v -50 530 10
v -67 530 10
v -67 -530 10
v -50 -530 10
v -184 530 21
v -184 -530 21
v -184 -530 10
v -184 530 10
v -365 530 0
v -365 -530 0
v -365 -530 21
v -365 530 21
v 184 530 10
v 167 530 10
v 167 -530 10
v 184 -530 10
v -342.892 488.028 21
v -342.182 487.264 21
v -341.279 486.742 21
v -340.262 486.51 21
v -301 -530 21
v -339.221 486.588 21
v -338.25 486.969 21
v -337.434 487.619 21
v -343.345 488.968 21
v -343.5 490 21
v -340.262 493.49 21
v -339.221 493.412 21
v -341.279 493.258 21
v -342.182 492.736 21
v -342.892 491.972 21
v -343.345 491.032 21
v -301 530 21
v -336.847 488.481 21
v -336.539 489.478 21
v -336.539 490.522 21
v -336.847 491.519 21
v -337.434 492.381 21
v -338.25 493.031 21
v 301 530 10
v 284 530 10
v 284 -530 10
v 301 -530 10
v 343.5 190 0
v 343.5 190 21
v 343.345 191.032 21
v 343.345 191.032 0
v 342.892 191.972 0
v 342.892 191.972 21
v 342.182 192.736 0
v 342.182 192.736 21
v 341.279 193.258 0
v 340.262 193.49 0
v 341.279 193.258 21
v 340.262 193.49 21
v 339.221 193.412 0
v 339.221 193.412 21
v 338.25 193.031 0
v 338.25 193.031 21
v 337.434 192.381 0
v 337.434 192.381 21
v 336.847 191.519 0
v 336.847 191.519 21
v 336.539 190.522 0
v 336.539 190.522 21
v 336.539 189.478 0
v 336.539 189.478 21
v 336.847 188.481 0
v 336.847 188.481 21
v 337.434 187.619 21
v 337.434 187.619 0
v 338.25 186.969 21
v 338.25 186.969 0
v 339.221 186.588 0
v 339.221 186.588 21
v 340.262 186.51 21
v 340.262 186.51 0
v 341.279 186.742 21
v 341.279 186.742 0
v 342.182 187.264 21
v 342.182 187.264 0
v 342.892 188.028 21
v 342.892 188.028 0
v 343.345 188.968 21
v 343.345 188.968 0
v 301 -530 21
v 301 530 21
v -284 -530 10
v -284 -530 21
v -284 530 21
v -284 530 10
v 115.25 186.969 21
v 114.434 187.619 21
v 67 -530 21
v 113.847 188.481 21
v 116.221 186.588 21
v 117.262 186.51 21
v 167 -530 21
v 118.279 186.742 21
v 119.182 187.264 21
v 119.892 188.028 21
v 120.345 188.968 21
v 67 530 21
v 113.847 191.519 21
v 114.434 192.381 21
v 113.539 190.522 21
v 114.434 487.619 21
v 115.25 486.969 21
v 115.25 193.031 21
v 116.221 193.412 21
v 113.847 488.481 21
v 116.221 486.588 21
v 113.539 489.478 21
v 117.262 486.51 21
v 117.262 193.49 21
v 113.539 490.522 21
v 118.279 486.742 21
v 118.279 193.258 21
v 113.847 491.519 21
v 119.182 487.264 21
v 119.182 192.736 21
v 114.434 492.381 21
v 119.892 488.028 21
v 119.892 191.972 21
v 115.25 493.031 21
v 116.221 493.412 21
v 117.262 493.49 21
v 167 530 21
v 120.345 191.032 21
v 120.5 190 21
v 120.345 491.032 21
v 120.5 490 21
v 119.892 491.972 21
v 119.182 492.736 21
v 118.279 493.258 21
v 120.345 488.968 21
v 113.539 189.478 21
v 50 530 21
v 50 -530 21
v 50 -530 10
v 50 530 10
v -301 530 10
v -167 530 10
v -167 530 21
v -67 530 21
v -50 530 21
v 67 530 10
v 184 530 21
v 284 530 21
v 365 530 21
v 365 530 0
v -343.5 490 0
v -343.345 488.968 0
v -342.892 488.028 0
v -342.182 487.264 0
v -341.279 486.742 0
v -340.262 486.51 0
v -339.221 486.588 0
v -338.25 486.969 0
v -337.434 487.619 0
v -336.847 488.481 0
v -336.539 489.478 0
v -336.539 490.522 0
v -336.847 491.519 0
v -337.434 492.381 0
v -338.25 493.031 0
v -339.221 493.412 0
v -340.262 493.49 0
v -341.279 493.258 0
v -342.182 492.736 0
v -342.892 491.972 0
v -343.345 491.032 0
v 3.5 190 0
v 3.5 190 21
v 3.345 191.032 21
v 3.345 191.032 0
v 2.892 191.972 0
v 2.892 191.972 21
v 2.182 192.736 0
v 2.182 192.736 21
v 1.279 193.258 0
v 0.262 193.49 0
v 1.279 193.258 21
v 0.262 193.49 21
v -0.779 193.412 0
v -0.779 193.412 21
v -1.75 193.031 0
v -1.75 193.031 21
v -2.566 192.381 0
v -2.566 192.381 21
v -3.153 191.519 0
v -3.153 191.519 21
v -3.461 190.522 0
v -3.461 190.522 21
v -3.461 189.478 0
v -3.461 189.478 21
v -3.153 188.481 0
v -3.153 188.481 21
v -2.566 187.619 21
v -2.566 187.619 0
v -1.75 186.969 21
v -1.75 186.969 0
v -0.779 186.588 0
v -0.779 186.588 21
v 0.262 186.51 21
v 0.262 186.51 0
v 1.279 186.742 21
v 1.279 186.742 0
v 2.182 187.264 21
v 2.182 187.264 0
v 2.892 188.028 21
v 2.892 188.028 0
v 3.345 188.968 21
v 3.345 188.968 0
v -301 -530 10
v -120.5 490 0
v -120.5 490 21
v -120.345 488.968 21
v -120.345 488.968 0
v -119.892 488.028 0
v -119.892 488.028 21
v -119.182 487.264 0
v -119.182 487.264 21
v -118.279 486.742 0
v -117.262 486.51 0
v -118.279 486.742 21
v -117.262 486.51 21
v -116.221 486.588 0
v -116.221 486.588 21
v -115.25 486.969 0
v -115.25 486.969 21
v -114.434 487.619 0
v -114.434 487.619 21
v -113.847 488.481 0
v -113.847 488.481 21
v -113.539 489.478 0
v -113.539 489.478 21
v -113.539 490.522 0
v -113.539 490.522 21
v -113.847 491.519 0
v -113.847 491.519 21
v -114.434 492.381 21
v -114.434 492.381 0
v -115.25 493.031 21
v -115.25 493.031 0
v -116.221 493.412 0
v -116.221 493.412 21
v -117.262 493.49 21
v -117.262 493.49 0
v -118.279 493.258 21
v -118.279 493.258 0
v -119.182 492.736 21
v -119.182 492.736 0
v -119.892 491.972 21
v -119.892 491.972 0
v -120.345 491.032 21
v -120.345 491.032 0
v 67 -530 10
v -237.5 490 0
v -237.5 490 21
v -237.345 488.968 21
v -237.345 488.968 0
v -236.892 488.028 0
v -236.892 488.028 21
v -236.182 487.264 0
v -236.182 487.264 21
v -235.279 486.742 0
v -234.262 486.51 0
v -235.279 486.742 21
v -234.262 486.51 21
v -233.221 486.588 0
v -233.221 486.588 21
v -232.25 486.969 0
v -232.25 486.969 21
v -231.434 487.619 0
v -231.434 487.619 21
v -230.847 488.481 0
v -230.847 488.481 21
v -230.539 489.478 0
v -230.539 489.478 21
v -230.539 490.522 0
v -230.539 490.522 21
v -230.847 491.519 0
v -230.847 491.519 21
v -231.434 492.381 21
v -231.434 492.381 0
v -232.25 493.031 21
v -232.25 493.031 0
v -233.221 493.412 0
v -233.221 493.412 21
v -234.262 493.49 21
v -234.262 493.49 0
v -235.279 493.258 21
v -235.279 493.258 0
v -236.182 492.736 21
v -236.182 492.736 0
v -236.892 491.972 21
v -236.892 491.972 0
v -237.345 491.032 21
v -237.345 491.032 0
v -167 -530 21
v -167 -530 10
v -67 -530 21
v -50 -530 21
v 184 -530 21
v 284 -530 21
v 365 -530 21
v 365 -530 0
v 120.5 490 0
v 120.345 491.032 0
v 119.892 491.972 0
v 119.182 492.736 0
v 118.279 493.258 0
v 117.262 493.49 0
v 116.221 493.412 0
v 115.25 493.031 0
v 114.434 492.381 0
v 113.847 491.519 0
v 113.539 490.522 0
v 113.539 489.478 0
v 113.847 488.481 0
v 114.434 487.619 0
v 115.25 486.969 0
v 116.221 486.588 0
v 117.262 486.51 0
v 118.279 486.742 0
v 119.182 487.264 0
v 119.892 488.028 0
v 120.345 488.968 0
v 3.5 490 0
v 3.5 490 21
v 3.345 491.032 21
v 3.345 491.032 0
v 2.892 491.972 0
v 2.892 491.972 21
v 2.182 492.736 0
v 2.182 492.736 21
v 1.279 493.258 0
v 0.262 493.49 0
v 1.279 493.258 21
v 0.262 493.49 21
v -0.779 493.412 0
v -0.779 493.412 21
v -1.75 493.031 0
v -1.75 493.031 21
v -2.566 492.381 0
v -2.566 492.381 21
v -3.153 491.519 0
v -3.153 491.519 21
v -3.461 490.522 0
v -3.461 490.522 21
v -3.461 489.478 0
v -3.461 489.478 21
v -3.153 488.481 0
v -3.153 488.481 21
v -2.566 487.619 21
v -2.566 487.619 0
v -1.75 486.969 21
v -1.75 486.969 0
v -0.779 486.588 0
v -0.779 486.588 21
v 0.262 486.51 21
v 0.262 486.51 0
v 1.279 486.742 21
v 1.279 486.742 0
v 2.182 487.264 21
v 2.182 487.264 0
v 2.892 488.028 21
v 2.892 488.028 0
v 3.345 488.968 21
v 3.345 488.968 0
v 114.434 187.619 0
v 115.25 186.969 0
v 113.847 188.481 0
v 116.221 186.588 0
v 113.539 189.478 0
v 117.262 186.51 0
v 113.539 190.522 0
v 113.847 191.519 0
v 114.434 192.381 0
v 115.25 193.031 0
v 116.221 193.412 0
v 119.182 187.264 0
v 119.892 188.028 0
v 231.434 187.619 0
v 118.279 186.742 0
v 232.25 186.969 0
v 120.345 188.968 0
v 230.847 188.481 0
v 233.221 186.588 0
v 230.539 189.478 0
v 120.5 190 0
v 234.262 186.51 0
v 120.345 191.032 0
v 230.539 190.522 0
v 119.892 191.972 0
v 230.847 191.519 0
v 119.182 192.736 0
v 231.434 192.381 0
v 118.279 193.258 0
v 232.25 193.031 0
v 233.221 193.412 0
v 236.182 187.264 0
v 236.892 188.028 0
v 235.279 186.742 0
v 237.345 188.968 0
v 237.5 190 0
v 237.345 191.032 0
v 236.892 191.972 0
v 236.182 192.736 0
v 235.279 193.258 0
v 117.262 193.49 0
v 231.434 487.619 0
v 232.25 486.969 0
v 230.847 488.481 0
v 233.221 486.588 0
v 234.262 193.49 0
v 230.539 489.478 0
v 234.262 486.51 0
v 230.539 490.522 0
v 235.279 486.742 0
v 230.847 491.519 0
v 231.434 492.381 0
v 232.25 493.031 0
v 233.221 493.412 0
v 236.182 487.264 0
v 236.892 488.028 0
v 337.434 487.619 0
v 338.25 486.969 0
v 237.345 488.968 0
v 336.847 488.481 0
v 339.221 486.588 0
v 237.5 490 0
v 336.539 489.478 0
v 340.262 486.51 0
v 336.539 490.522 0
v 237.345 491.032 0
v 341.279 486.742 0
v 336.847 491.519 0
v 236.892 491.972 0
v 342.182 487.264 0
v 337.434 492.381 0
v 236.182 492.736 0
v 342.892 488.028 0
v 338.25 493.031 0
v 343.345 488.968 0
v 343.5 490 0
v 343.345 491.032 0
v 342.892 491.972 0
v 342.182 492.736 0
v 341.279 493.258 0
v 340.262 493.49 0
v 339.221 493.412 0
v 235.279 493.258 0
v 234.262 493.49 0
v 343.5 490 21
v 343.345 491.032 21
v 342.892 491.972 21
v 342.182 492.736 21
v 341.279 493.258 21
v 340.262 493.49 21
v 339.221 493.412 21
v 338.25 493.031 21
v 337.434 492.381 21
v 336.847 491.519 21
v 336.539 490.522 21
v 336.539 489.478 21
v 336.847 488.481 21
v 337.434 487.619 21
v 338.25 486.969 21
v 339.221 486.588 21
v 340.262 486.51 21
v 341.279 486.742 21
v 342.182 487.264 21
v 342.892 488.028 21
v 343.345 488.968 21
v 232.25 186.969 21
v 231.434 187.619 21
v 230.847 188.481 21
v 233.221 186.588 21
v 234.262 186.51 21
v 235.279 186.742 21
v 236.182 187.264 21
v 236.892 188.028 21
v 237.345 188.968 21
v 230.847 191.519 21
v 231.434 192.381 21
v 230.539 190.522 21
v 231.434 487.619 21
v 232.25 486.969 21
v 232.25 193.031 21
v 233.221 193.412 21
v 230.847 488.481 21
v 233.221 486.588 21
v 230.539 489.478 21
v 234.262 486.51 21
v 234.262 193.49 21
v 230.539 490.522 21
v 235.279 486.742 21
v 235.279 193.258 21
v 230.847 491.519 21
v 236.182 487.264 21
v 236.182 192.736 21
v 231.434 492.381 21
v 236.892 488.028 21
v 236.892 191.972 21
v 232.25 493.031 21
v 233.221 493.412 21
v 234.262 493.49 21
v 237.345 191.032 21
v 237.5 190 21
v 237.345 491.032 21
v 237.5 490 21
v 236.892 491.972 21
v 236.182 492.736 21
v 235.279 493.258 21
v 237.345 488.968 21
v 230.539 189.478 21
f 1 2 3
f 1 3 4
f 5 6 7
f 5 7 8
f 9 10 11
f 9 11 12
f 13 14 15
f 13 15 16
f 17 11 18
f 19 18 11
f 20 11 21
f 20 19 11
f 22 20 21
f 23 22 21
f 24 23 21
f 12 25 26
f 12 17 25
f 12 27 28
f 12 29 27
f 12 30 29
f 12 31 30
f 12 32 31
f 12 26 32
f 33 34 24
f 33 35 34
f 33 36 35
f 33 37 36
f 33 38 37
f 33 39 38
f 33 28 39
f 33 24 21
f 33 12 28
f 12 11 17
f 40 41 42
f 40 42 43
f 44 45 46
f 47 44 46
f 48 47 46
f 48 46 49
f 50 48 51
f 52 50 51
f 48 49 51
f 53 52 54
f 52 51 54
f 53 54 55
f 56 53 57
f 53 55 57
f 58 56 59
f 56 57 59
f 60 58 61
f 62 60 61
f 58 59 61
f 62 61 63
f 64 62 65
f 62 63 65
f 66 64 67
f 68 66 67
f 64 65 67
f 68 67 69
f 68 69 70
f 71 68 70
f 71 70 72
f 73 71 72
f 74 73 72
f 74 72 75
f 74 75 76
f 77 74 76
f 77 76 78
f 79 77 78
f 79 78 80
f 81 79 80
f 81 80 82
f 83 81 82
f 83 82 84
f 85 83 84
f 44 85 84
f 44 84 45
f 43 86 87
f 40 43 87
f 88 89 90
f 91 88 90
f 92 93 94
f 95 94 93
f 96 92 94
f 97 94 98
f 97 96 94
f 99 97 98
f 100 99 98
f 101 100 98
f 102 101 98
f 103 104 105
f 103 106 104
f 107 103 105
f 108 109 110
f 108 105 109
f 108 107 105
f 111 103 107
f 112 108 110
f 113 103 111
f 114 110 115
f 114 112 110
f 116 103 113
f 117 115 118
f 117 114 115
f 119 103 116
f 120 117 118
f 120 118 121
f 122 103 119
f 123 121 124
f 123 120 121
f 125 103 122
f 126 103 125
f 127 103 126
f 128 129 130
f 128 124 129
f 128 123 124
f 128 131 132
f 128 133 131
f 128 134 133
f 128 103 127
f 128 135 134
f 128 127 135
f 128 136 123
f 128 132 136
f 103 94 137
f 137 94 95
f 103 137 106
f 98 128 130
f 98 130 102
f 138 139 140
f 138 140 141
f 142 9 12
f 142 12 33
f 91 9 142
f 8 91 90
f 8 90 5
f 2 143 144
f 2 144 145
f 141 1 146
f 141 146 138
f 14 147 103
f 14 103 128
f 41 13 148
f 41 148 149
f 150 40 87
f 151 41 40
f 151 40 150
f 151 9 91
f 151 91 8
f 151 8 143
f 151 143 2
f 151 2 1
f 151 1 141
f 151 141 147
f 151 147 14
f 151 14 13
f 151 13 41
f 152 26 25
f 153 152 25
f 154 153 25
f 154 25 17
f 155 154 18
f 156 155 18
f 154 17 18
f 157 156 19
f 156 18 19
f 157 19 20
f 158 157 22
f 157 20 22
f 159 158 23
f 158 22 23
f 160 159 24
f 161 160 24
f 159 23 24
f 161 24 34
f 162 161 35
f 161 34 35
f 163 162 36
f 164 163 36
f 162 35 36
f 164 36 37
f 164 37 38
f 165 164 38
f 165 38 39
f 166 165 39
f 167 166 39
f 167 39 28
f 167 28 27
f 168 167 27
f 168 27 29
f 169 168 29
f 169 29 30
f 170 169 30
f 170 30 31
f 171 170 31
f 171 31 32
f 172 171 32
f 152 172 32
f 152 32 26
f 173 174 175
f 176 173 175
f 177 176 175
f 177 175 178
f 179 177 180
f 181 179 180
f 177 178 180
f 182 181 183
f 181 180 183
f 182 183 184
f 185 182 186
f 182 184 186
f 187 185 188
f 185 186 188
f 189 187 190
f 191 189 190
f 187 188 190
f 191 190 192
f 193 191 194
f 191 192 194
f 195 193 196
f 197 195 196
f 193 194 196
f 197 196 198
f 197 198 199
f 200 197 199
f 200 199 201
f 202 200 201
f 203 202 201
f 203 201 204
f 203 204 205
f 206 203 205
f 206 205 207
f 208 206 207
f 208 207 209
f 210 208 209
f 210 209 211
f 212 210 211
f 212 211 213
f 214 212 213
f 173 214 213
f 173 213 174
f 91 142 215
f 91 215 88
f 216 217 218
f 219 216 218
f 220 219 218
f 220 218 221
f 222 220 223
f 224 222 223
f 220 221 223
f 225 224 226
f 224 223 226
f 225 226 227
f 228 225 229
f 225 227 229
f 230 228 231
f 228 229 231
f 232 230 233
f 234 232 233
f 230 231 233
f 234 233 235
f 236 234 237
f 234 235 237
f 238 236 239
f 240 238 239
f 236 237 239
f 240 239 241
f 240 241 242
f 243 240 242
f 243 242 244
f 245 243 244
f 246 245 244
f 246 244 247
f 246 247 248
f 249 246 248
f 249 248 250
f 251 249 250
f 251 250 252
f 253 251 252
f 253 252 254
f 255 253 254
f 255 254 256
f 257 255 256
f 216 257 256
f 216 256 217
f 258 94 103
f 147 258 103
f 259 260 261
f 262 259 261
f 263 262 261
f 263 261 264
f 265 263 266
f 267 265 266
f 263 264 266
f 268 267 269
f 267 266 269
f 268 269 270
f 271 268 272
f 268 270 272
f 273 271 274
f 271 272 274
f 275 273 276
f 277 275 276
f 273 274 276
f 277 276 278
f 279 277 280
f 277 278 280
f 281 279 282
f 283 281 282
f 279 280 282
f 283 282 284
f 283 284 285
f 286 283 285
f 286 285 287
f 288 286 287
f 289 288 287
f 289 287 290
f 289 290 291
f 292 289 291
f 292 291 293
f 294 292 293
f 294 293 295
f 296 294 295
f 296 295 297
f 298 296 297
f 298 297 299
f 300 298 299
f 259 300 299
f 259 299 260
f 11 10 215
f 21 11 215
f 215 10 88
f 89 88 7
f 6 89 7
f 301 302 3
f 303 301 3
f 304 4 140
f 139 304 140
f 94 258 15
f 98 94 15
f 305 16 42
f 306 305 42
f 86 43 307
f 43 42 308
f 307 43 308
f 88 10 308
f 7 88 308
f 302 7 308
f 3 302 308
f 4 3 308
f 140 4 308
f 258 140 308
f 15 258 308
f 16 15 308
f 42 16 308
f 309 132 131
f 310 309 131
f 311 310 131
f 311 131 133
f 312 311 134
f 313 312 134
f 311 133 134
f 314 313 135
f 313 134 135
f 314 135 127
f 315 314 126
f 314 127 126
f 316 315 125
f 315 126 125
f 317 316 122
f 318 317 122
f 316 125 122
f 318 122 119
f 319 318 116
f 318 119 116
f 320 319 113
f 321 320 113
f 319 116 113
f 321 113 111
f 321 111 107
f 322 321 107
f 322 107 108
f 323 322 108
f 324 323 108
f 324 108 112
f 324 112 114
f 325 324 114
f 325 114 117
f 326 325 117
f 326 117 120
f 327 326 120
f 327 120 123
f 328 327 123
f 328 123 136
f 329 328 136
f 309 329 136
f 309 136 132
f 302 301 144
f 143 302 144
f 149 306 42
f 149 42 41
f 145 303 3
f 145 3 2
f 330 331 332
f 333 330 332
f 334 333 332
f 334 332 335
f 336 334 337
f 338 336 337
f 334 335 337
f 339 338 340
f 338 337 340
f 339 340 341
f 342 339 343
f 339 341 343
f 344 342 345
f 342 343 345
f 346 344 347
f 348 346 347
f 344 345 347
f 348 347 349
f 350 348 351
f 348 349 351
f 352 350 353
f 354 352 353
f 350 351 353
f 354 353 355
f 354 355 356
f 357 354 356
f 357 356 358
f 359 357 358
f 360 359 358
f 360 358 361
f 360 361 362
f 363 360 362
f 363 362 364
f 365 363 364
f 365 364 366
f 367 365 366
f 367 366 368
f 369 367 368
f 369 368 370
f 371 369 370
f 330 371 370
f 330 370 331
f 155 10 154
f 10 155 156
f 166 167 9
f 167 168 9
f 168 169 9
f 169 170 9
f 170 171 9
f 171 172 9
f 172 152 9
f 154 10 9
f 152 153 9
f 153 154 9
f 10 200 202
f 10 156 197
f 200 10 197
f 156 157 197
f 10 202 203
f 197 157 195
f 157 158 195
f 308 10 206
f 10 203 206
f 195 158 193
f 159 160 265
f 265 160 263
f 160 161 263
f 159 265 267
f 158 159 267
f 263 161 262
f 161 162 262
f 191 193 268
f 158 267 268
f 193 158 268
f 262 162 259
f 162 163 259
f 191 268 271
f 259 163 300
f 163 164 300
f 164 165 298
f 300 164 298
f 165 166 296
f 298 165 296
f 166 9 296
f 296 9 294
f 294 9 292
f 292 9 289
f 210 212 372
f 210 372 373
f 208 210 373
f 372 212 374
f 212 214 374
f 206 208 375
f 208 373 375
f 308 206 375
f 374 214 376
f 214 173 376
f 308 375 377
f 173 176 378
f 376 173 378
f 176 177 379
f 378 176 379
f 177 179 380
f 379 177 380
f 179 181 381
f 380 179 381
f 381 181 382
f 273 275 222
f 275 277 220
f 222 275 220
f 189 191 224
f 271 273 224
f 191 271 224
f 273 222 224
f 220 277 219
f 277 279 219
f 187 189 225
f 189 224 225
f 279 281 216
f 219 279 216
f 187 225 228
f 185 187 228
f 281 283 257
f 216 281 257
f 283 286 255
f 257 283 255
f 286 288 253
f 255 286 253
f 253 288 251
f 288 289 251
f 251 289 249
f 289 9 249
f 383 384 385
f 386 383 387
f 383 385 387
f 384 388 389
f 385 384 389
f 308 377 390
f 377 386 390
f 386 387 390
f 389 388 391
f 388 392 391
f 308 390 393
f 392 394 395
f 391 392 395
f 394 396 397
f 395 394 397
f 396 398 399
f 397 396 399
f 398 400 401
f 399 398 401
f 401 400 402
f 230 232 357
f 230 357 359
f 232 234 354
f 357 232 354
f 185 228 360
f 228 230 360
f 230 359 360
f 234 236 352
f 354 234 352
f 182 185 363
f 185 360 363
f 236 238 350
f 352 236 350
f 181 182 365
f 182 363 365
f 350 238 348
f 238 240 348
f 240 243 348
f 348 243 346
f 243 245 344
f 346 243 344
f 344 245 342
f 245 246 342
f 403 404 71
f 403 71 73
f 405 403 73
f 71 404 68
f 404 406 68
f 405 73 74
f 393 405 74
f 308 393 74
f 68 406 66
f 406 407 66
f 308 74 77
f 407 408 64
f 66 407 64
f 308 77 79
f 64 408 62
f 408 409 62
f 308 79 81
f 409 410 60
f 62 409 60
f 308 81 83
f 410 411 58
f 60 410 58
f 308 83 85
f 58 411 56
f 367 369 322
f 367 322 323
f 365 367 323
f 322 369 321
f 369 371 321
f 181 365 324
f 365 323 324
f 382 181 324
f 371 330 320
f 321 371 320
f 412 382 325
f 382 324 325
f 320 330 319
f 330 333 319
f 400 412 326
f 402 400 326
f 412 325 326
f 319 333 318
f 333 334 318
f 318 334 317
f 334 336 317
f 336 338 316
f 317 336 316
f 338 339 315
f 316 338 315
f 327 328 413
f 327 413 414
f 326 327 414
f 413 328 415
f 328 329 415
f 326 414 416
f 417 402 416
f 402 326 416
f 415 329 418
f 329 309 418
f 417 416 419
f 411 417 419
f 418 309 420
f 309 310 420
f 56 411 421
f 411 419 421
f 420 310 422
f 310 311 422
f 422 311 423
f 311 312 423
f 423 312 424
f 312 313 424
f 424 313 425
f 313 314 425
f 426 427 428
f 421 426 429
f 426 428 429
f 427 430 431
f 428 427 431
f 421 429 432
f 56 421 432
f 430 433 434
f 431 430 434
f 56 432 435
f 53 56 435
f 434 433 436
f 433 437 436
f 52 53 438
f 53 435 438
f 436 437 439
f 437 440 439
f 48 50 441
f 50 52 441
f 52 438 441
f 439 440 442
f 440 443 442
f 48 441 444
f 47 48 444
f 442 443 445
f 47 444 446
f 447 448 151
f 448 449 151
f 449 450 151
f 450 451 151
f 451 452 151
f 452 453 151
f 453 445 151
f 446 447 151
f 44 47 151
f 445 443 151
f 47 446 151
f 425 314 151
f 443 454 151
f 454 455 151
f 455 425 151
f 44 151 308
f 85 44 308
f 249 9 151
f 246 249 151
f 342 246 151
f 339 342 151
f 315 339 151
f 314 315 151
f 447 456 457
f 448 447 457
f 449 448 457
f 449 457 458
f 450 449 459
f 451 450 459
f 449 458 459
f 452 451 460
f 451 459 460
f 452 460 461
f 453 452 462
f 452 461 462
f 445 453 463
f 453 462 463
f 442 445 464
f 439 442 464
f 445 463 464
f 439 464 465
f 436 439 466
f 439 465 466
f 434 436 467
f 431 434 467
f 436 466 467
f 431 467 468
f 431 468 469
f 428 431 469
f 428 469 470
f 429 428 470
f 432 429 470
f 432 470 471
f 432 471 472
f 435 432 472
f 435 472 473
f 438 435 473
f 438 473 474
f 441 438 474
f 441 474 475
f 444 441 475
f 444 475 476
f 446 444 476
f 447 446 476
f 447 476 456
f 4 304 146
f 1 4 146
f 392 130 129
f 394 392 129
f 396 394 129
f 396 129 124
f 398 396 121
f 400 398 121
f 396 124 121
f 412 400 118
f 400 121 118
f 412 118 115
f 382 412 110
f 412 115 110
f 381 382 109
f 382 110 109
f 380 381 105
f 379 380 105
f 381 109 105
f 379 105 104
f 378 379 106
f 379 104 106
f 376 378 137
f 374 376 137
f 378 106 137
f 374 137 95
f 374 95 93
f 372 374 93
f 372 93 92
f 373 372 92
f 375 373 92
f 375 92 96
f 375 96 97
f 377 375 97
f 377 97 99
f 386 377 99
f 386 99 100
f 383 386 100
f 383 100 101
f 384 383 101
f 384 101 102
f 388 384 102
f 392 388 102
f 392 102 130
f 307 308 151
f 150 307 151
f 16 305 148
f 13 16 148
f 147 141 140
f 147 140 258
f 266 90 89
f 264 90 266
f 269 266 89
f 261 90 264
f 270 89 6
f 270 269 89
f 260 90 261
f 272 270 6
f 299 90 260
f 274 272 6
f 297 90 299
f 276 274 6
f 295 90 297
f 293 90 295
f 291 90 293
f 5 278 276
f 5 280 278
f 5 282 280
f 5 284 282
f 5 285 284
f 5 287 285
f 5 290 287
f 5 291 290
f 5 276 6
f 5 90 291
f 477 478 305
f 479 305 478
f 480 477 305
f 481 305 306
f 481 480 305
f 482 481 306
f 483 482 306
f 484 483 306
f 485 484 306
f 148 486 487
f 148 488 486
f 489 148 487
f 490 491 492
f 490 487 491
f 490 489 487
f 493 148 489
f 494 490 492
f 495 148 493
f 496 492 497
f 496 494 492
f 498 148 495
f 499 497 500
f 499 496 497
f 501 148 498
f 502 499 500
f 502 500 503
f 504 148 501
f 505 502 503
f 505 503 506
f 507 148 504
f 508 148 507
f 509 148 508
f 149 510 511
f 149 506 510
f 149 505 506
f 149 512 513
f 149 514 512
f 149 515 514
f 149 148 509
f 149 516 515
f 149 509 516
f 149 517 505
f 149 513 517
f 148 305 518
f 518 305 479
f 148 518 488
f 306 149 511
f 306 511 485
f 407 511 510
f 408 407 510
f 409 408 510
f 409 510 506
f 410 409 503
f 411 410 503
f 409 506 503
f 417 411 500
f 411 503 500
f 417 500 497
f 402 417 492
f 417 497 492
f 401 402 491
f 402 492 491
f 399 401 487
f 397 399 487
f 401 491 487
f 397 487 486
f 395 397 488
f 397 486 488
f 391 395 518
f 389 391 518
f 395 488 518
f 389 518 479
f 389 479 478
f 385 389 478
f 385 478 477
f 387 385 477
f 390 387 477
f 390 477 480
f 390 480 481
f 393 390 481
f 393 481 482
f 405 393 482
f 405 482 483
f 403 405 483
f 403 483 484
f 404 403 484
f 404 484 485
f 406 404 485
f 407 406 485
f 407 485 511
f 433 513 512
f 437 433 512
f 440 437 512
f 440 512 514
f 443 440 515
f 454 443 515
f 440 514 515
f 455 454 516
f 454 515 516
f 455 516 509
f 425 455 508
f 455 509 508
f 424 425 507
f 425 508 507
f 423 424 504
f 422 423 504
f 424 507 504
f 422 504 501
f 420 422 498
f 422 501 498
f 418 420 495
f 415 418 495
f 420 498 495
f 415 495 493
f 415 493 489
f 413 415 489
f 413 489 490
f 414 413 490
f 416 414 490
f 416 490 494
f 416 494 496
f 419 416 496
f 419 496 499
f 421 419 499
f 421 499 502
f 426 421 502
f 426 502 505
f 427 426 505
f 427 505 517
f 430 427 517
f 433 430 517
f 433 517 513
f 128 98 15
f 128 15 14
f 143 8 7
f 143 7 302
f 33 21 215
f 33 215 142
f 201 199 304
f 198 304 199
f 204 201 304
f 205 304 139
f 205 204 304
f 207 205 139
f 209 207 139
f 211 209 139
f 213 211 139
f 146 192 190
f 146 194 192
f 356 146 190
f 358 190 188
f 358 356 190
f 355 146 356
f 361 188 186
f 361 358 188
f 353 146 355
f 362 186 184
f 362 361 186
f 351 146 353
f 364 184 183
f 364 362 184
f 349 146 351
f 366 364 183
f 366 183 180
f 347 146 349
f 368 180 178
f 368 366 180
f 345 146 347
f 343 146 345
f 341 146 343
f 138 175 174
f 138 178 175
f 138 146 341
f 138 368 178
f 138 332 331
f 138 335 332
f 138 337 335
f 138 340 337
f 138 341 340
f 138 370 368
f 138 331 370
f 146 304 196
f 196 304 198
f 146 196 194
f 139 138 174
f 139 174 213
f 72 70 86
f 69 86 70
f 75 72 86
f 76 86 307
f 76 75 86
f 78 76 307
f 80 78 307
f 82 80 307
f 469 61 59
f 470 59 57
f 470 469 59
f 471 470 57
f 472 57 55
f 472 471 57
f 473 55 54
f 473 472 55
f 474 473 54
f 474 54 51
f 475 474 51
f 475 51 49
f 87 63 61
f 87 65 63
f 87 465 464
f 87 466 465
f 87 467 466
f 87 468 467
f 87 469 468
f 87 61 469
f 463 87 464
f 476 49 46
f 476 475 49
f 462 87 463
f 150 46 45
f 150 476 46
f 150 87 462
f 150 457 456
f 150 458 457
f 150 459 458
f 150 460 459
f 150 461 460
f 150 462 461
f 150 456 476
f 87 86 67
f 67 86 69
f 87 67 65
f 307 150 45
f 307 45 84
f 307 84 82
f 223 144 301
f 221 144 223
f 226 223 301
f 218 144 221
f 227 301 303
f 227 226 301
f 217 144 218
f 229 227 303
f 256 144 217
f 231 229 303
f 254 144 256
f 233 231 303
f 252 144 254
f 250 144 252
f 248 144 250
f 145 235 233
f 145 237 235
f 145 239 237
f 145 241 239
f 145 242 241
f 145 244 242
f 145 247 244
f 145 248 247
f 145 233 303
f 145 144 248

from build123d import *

# Parameters (mm, degrees)
SKIZZE1_W                       = 730
SKIZZE1_H                       = 1060
AUFSATZ_LINEAR_AUSTRAGEN1_DEPTH = 21
SKIZZE2_W                       = 17
SKIZZE2_H                       = 1060
SCHNITT_LINEAR_AUSTRAGEN1_DEPTH = 11
SKIZZE3_R                       = 3.5
SCHNITT_LINEAR_AUSTRAGEN2_DEPTH = 40


with BuildPart() as part:
    # Skizze1 → Aufsatz-Linear austragen1 (new body)
    with BuildSketch(Plane.XY):
        Rectangle(SKIZZE1_W, SKIZZE1_H)
    extrude(amount=AUFSATZ_LINEAR_AUSTRAGEN1_DEPTH)

    # Skizze2 → Schnitt-Linear austragen1 (cut)
    with BuildSketch(Plane.XY.offset(21)):
        with Locations((58.5, 0)):
            Rectangle(SKIZZE2_W, SKIZZE2_H)
        with Locations((175.5, 0)):
            Rectangle(SKIZZE2_W, SKIZZE2_H)
        with Locations((292.5, 0)):
            Rectangle(SKIZZE2_W, SKIZZE2_H)
        with Locations((-292.5, 0)):
            Rectangle(SKIZZE2_W, SKIZZE2_H)
        with Locations((-175.5, 0)):
            Rectangle(SKIZZE2_W, SKIZZE2_H)
        with Locations((-58.5, 0)):
            Rectangle(SKIZZE2_W, SKIZZE2_H)
    extrude(amount=-SCHNITT_LINEAR_AUSTRAGEN1_DEPTH, mode=Mode.SUBTRACT)

    # Skizze3 → Schnitt-Linear austragen2 (cut)
    with BuildSketch(Plane.XY.offset(21)):
        with Locations((0, 490)):
            Circle(SKIZZE3_R)
        with Locations((117, 490)):
            Circle(SKIZZE3_R)
        with Locations((234, 490)):
            Circle(SKIZZE3_R)
        with Locations((340, 490)):
            Circle(SKIZZE3_R)
        with Locations((340, 190)):
            Circle(SKIZZE3_R)
        with Locations((234, 190)):
            Circle(SKIZZE3_R)
        with Locations((117, 190)):
            Circle(SKIZZE3_R)
        with Locations((0, 190)):
            Circle(SKIZZE3_R)
        with Locations(Location((-340, 490, 0), (0, 0, 180))):
            Circle(SKIZZE3_R)
        with Locations(Location((-234, 490, 0), (0, 0, 180))):
            Circle(SKIZZE3_R)
        with Locations(Location((-117, 490, 0), (0, 0, 180))):
            Circle(SKIZZE3_R)
    extrude(amount=-SCHNITT_LINEAR_AUSTRAGEN2_DEPTH, mode=Mode.SUBTRACT)


solid = part.part
